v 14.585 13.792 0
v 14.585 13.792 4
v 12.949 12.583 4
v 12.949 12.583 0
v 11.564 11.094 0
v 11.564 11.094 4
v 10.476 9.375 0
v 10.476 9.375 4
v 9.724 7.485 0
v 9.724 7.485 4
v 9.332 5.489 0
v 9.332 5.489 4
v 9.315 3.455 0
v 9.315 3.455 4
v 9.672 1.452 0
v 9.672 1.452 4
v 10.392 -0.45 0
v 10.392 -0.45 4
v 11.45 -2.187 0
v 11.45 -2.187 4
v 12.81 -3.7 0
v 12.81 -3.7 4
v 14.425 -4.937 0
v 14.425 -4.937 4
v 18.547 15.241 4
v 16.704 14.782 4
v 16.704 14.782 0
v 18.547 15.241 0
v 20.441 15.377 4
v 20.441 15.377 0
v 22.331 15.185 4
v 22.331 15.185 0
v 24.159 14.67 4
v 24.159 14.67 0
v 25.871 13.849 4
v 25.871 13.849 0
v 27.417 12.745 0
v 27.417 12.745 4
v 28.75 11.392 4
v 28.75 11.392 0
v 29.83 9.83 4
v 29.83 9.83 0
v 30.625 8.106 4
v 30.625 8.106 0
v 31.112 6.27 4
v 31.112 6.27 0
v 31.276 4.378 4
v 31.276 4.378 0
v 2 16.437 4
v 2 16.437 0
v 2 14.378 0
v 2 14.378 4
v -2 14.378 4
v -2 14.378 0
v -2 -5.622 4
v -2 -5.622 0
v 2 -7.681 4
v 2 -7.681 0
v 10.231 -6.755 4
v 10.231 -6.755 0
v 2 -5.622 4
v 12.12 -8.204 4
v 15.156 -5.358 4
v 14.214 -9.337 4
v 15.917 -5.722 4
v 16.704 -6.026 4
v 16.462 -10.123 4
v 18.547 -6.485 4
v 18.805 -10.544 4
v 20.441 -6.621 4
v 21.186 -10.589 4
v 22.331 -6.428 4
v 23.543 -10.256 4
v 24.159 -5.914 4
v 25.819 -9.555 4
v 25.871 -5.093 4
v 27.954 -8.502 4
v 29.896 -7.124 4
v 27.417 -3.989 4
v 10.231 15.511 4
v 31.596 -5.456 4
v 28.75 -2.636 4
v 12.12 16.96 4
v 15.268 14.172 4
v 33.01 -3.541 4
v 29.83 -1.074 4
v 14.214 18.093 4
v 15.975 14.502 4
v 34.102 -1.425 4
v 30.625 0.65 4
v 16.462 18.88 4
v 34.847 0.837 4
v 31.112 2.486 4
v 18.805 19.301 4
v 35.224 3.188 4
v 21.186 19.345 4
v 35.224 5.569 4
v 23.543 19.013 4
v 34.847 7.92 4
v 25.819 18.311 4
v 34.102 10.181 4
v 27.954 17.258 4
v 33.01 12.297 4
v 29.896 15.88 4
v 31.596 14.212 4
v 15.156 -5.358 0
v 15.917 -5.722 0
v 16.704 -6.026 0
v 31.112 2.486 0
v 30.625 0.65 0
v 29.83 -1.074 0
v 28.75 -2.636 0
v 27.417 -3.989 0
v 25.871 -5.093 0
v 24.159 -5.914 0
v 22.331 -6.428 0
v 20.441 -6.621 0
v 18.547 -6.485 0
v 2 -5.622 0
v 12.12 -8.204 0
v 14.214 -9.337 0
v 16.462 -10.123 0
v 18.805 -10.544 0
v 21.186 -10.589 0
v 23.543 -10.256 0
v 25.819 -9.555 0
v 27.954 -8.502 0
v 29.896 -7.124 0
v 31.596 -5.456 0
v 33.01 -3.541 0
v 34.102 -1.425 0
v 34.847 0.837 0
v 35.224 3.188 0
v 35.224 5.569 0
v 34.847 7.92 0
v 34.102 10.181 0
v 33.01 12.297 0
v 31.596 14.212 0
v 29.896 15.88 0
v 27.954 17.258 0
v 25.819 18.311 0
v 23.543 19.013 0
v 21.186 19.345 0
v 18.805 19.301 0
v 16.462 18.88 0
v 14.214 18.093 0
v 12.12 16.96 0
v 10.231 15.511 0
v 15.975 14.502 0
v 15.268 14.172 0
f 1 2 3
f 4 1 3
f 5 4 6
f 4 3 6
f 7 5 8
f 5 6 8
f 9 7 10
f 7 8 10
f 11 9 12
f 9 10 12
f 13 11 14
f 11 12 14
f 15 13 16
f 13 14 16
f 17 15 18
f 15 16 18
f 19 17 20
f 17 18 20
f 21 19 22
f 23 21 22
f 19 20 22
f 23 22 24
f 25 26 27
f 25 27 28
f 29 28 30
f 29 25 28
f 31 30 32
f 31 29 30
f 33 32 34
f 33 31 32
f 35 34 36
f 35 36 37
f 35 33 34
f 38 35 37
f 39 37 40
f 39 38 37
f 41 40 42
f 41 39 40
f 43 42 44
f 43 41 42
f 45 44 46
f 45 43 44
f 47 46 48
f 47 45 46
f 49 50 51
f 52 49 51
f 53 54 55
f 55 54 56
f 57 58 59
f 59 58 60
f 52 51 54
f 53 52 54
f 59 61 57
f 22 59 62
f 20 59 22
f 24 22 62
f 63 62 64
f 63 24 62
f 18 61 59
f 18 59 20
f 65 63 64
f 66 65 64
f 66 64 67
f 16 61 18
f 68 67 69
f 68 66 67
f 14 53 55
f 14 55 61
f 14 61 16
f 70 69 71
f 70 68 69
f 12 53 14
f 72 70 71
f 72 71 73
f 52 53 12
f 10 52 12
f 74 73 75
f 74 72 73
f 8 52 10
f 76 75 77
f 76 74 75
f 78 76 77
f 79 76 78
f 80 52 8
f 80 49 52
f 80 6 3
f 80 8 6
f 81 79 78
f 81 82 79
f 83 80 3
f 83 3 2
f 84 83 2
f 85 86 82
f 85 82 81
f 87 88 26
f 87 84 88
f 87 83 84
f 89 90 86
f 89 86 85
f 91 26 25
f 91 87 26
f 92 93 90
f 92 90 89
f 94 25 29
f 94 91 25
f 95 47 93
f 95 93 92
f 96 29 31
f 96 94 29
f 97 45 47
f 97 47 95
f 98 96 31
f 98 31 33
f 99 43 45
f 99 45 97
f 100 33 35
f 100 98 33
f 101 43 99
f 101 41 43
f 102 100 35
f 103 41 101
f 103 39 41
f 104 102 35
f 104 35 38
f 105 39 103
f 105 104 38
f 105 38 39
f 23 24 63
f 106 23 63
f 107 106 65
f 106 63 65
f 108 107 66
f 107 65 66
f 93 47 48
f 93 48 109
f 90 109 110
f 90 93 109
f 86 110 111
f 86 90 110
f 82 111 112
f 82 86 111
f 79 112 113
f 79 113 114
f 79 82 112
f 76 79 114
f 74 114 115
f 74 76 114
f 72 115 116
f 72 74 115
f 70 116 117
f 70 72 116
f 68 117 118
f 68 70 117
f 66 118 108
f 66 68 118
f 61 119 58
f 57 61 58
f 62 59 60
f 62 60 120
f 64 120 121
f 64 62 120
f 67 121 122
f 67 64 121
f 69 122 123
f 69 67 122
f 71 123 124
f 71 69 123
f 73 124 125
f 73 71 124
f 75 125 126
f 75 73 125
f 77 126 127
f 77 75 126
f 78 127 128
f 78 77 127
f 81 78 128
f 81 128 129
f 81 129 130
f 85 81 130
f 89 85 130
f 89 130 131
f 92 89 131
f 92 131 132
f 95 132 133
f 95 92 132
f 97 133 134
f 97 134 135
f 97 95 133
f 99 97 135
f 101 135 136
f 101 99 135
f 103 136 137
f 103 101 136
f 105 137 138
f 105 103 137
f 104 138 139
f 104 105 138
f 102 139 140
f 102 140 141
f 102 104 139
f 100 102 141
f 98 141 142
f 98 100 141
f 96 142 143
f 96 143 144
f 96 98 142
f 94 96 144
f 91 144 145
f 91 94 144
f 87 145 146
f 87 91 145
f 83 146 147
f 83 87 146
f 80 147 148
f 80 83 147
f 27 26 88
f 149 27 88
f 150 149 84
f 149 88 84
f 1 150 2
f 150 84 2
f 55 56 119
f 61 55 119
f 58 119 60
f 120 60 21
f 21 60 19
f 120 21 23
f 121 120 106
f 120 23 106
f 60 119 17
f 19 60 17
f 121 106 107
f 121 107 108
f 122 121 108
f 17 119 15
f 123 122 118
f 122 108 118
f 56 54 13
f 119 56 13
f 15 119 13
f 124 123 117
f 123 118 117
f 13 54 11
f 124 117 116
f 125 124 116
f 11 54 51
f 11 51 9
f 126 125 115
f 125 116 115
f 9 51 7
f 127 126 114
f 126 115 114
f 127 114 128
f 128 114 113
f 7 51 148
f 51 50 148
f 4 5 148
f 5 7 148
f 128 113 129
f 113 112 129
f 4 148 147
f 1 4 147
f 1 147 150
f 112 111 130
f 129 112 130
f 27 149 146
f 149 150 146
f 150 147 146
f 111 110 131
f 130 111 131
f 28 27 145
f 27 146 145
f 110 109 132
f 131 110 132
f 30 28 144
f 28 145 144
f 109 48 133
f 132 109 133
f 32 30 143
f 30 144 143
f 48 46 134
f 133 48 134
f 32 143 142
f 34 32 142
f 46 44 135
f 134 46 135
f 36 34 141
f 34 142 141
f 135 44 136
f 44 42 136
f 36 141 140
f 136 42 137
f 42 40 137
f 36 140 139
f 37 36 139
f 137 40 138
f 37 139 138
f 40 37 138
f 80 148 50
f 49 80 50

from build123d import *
from build123d.topology import SkipClean

# Parameters (mm, degrees)
CROQUIS1_R              = 4.2
SALIENTE_EXTRUIR1_DEPTH = 4
SALIENTE_EXTRUIR2_DEPTH = 4
CROQUIS2_3_R            = 4.2
CORTAR_EXTRUIR1_DEPTH   = 4


with BuildPart() as part:
    # Croquis1 → Saliente-Extruir1 (new body)
    with BuildSketch(Plane.XY):
        with BuildLine():
            Line((2, 14.378089444), (-2, 14.378089444))
            Line((-2, 14.378089444), (-2, -5.621910556))
            Line((-2, -5.621910556), (2, -5.621910556))
            Line((2, -5.621910556), (2, -7.681185842))
            Line((2, -7.681185842), (20.292265124, -5.621910556))
            ThreePointArc((20.292265124, -5.621910556), (30.276145575, 4.378089444), (20.292265124, 14.378089444))
            Line((20.292265124, 14.378089444), (2, 16.43736473))
            Line((2, 16.43736473), (2, 14.378089444))
        make_face()
        with Locations((20.276132562, 4.378089444)):
            Circle(CROQUIS1_R, mode=Mode.SUBTRACT)
    extrude(amount=SALIENTE_EXTRUIR1_DEPTH)

    # Croquis2 → Saliente-Extruir2 (add)
    with BuildSketch(Plane.XY.offset(4)):
        with BuildLine():
            ThreePointArc((10.23085334, -6.754586935), (35.270935596, 4.378089444), (10.23085334, 15.510765823))
            Line((10.23085334, 15.510765823), (16.704250968, 14.782014755))
            ThreePointArc((16.704250968, 14.782014755), (26.667896891, 13.33048291), (31.276132562, 4.378089444))
            ThreePointArc((31.276132562, 4.378089444), (26.667896891, -4.574304022), (16.704250968, -6.025835867))
            Line((16.704250968, -6.025835867), (10.23085334, -6.754586935))
        make_face()
    extrude(amount=-SALIENTE_EXTRUIR2_DEPTH)

    # Croquis2<3> → Cortar-Extruir1 (cut)
    with SkipClean():  # the faces are left unmerged after this step: merging them gives an invalid solid
        with BuildSketch(Plane.XY.offset(4)):
            with BuildLine():
                ThreePointArc((16.704250968, 14.782014755), (15.618415295, 14.343312465), (14.585373454, 13.791657353))
                ThreePointArc((14.585373454, 13.791657353), (9.276534219, 4.472091013), (14.425321372, -4.936845253))
                ThreePointArc((14.425321372, -4.936845253), (15.533426587, -5.546966729), (16.704250968, -6.025835867))
                Line((16.704250968, -6.025835867), (20.292265124, -5.621910556))
                ThreePointArc((20.292265124, -5.621910556), (30.276145575, 4.378089444), (20.292265124, 14.378089444))
                Line((20.292265124, 14.378089444), (16.704250968, 14.782014755))
            make_face()
            with Locations((20.276132562, 4.378089444)):
                Circle(CROQUIS2_3_R, mode=Mode.SUBTRACT)
        extrude(amount=-CORTAR_EXTRUIR1_DEPTH, mode=Mode.SUBTRACT)


solid = part.part
